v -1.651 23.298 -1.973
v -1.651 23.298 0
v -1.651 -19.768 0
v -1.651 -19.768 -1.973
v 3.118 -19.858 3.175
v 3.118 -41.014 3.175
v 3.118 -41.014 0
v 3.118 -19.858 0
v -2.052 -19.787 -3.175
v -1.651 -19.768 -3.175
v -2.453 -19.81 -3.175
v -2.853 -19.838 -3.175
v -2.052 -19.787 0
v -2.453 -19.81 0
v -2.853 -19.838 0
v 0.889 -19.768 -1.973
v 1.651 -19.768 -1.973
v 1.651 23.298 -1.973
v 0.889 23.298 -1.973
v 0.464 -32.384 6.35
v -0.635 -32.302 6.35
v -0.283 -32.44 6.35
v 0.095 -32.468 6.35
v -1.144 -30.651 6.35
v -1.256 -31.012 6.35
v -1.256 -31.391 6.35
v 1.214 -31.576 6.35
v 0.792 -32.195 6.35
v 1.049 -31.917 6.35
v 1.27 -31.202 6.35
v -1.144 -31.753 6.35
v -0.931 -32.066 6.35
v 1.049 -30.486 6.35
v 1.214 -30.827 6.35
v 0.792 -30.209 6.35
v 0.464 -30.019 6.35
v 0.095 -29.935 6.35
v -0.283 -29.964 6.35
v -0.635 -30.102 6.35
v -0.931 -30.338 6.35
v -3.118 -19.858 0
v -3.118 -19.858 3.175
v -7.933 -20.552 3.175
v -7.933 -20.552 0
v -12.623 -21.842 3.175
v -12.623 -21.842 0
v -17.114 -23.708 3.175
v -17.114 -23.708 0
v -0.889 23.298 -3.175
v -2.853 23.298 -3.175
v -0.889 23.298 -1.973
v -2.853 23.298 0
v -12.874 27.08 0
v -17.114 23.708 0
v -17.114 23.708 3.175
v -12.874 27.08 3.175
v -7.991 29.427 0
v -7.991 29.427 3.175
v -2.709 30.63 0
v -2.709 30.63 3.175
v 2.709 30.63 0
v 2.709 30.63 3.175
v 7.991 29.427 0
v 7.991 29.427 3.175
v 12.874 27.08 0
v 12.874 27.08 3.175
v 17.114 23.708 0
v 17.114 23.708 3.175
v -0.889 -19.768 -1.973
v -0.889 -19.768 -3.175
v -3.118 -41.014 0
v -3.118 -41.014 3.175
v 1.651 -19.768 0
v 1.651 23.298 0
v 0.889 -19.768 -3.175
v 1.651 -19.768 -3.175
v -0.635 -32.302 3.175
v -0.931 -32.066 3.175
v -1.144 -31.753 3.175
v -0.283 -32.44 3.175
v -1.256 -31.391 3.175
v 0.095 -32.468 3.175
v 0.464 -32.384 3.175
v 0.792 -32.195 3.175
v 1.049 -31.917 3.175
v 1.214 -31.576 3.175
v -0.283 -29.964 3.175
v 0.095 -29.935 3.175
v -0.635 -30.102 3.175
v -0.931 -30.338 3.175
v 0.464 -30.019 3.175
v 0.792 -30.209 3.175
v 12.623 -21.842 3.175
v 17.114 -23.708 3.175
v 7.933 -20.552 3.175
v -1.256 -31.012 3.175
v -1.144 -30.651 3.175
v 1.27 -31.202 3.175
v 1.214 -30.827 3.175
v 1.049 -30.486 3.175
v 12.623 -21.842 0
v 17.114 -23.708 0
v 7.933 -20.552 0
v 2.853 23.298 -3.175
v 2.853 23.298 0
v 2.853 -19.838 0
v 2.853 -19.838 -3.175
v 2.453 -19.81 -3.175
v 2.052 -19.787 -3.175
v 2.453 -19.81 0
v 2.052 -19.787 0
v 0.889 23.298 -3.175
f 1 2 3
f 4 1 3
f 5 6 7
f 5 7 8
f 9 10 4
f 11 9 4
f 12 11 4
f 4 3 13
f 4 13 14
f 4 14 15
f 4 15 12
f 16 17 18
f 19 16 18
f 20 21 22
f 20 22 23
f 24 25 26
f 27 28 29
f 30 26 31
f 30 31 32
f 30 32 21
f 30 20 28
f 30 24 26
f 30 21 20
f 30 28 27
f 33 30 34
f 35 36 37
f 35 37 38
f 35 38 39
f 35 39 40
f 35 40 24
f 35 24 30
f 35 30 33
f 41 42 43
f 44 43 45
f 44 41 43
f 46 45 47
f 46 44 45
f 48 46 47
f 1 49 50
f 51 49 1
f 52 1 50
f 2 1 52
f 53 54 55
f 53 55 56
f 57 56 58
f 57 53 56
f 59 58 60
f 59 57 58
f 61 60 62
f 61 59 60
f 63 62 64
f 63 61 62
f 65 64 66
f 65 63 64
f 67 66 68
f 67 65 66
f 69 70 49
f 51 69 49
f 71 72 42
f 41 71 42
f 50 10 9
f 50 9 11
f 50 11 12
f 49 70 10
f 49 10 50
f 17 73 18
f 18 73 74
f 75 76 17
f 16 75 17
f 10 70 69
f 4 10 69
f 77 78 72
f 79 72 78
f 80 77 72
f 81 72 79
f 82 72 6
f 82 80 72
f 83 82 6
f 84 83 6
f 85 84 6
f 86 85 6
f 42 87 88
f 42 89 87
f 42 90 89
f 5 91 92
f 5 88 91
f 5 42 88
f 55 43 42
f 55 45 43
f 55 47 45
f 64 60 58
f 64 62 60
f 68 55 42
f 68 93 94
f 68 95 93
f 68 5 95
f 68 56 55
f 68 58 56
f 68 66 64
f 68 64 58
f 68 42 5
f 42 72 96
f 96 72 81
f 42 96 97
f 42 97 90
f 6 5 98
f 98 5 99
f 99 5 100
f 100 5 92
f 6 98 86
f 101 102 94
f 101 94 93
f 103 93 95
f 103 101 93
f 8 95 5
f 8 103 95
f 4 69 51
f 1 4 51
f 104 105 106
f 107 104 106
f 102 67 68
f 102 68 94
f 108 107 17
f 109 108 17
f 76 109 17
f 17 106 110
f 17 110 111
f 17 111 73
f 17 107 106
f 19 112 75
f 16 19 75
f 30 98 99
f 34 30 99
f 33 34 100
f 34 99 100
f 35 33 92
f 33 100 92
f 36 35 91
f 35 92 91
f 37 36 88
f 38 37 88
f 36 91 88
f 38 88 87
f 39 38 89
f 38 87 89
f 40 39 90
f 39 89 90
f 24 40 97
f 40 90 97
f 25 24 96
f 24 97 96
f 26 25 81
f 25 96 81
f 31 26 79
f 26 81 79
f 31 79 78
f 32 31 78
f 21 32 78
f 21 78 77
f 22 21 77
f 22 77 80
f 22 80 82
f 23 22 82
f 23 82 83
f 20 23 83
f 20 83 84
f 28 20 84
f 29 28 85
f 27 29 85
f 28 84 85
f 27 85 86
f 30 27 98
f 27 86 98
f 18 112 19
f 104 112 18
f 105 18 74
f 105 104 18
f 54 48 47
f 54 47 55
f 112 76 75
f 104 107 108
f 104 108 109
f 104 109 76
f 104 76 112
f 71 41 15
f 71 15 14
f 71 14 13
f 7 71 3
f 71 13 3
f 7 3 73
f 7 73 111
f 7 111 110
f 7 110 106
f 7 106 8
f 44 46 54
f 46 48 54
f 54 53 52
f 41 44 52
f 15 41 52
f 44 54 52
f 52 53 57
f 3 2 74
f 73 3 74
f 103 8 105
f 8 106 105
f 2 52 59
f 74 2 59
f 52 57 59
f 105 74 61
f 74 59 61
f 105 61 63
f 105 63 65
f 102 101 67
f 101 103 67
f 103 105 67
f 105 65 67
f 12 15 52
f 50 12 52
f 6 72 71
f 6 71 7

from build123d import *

# Parameters (mm, degrees)
BOSS_EXTRUDE1_DEPTH = 3.175
BOSS_EXTRUDE2_DEPTH = 3.175
SKETCH3_W           = 6.236959702
SKETCH3_H           = 41.352711554
BOSS_EXTRUDE3_DEPTH = 3.175
SKETCH4_R           = 1.27
BOSS_EXTRUDE4_DEPTH = 3.175
BOSS_EXTRUDE5_REACH = 20.766
SKETCH6_W           = 1.202138058
SKETCH6_H           = 43.066281197
CUT_EXTRUDE1_REACH  = 11.525


with BuildPart() as part:
    # Sketch1 → Boss-Extrude1 (new body)
    with BuildSketch(Plane.XY):
        with BuildLine():
            Line((-17.114253333, -23.707583903), (-17.114253333, 23.707583903))
            ThreePointArc((-17.114253333, 23.707583903), (0, 30.782200079), (17.114253333, 23.707583903))
            Line((17.114253333, 23.707583903), (17.114253333, -23.707583903))
            ThreePointArc((17.114253333, -23.707583903), (0, -19.732802645), (-17.114253333, -23.707583903))
        make_face()
    extrude(amount=BOSS_EXTRUDE1_DEPTH)

    # Sketch2 → Boss-Extrude2 (add)
    with BuildSketch(Plane(origin=(0, 0, 0), x_dir=(-1, 0, 0), z_dir=(0, 0, -1))):
        with BuildLine():
            Line((-1.65128862, -19.767928257), (-1.65128862, 22.268343179))
            Line((-1.65128862, 22.268343179), (-1.65128862, 23.29835294))
            Line((-1.65128862, 23.29835294), (-2.853426735, 23.29835294))
            Line((-2.853426735, 23.29835294), (-2.853426735, -19.837781624))
            ThreePointArc((-2.853426735, -19.837781624), (-2.25262846, -19.798194915), (-1.65128862, -19.767928257))
        make_face()
        with BuildLine():
            Line((1.65128862, 23.29835294), (1.65128862, 22.268343179))
            Line((1.65128862, 22.268343179), (1.65128862, -19.767928257))
            ThreePointArc((1.65128862, -19.767928257), (2.25262846, -19.798194915), (2.853426735, -19.837781624))
            Line((2.853426735, -19.837781624), (2.853426735, 23.29835294))
            Line((2.853426735, 23.29835294), (1.65128862, 23.29835294))
        make_face()
    extrude(amount=BOSS_EXTRUDE2_DEPTH)

    # Sketch3 → Boss-Extrude3 (add)
    with BuildSketch(Plane.XY.offset(3.175)):
        with Locations((0, -20.33746726)):
            Rectangle(SKETCH3_W, SKETCH3_H)
    extrude(amount=-BOSS_EXTRUDE3_DEPTH)

    # Sketch4 → Boss-Extrude4 (add)
    with BuildSketch(Plane.XY.offset(3.175)):
        with Locations((0, -31.201683403)):
            Circle(SKETCH4_R)
    extrude(amount=BOSS_EXTRUDE4_DEPTH)

    # Sketch6 → Boss-Extrude5 (add, up to next)
    with BuildSketch(Plane.ZY.offset(-1.65128862), mode=Mode.PRIVATE) as boss_extrude5_sk1:
        with Locations((-2.573930971, 1.765212341)):
            Rectangle(SKETCH6_W, SKETCH6_H)
    boss_extrude5_tool1 = extrude(boss_extrude5_sk1.sketch, amount=BOSS_EXTRUDE5_REACH, mode=Mode.PRIVATE) - part.part
    add(boss_extrude5_tool1.solids().sort_by_distance((1.651289, 1.765212, -2.573931))[0])

    # Sketch8 → Cut-Extrude1 (cut, up to next)
    with BuildSketch(Plane(origin=(0, 0, -3.175), x_dir=(-1, 0, 0), z_dir=(0, 0, -1)), mode=Mode.PRIVATE) as cut_extrude1_sk1:
        Polygon((0, 23.29835294), (-0.889, 23.29835294), (-0.889, -19.767928257), (0.889, -19.767928257), (0.889, 23.29835294), align=None)
    cut_extrude1_tool1 = extrude(cut_extrude1_sk1.sketch, amount=-CUT_EXTRUDE1_REACH, mode=Mode.PRIVATE) & part.part
    add(cut_extrude1_tool1.solids().sort_by_distance((0, 1.765212, -3.175))[0], mode=Mode.SUBTRACT)


solid = part.part
